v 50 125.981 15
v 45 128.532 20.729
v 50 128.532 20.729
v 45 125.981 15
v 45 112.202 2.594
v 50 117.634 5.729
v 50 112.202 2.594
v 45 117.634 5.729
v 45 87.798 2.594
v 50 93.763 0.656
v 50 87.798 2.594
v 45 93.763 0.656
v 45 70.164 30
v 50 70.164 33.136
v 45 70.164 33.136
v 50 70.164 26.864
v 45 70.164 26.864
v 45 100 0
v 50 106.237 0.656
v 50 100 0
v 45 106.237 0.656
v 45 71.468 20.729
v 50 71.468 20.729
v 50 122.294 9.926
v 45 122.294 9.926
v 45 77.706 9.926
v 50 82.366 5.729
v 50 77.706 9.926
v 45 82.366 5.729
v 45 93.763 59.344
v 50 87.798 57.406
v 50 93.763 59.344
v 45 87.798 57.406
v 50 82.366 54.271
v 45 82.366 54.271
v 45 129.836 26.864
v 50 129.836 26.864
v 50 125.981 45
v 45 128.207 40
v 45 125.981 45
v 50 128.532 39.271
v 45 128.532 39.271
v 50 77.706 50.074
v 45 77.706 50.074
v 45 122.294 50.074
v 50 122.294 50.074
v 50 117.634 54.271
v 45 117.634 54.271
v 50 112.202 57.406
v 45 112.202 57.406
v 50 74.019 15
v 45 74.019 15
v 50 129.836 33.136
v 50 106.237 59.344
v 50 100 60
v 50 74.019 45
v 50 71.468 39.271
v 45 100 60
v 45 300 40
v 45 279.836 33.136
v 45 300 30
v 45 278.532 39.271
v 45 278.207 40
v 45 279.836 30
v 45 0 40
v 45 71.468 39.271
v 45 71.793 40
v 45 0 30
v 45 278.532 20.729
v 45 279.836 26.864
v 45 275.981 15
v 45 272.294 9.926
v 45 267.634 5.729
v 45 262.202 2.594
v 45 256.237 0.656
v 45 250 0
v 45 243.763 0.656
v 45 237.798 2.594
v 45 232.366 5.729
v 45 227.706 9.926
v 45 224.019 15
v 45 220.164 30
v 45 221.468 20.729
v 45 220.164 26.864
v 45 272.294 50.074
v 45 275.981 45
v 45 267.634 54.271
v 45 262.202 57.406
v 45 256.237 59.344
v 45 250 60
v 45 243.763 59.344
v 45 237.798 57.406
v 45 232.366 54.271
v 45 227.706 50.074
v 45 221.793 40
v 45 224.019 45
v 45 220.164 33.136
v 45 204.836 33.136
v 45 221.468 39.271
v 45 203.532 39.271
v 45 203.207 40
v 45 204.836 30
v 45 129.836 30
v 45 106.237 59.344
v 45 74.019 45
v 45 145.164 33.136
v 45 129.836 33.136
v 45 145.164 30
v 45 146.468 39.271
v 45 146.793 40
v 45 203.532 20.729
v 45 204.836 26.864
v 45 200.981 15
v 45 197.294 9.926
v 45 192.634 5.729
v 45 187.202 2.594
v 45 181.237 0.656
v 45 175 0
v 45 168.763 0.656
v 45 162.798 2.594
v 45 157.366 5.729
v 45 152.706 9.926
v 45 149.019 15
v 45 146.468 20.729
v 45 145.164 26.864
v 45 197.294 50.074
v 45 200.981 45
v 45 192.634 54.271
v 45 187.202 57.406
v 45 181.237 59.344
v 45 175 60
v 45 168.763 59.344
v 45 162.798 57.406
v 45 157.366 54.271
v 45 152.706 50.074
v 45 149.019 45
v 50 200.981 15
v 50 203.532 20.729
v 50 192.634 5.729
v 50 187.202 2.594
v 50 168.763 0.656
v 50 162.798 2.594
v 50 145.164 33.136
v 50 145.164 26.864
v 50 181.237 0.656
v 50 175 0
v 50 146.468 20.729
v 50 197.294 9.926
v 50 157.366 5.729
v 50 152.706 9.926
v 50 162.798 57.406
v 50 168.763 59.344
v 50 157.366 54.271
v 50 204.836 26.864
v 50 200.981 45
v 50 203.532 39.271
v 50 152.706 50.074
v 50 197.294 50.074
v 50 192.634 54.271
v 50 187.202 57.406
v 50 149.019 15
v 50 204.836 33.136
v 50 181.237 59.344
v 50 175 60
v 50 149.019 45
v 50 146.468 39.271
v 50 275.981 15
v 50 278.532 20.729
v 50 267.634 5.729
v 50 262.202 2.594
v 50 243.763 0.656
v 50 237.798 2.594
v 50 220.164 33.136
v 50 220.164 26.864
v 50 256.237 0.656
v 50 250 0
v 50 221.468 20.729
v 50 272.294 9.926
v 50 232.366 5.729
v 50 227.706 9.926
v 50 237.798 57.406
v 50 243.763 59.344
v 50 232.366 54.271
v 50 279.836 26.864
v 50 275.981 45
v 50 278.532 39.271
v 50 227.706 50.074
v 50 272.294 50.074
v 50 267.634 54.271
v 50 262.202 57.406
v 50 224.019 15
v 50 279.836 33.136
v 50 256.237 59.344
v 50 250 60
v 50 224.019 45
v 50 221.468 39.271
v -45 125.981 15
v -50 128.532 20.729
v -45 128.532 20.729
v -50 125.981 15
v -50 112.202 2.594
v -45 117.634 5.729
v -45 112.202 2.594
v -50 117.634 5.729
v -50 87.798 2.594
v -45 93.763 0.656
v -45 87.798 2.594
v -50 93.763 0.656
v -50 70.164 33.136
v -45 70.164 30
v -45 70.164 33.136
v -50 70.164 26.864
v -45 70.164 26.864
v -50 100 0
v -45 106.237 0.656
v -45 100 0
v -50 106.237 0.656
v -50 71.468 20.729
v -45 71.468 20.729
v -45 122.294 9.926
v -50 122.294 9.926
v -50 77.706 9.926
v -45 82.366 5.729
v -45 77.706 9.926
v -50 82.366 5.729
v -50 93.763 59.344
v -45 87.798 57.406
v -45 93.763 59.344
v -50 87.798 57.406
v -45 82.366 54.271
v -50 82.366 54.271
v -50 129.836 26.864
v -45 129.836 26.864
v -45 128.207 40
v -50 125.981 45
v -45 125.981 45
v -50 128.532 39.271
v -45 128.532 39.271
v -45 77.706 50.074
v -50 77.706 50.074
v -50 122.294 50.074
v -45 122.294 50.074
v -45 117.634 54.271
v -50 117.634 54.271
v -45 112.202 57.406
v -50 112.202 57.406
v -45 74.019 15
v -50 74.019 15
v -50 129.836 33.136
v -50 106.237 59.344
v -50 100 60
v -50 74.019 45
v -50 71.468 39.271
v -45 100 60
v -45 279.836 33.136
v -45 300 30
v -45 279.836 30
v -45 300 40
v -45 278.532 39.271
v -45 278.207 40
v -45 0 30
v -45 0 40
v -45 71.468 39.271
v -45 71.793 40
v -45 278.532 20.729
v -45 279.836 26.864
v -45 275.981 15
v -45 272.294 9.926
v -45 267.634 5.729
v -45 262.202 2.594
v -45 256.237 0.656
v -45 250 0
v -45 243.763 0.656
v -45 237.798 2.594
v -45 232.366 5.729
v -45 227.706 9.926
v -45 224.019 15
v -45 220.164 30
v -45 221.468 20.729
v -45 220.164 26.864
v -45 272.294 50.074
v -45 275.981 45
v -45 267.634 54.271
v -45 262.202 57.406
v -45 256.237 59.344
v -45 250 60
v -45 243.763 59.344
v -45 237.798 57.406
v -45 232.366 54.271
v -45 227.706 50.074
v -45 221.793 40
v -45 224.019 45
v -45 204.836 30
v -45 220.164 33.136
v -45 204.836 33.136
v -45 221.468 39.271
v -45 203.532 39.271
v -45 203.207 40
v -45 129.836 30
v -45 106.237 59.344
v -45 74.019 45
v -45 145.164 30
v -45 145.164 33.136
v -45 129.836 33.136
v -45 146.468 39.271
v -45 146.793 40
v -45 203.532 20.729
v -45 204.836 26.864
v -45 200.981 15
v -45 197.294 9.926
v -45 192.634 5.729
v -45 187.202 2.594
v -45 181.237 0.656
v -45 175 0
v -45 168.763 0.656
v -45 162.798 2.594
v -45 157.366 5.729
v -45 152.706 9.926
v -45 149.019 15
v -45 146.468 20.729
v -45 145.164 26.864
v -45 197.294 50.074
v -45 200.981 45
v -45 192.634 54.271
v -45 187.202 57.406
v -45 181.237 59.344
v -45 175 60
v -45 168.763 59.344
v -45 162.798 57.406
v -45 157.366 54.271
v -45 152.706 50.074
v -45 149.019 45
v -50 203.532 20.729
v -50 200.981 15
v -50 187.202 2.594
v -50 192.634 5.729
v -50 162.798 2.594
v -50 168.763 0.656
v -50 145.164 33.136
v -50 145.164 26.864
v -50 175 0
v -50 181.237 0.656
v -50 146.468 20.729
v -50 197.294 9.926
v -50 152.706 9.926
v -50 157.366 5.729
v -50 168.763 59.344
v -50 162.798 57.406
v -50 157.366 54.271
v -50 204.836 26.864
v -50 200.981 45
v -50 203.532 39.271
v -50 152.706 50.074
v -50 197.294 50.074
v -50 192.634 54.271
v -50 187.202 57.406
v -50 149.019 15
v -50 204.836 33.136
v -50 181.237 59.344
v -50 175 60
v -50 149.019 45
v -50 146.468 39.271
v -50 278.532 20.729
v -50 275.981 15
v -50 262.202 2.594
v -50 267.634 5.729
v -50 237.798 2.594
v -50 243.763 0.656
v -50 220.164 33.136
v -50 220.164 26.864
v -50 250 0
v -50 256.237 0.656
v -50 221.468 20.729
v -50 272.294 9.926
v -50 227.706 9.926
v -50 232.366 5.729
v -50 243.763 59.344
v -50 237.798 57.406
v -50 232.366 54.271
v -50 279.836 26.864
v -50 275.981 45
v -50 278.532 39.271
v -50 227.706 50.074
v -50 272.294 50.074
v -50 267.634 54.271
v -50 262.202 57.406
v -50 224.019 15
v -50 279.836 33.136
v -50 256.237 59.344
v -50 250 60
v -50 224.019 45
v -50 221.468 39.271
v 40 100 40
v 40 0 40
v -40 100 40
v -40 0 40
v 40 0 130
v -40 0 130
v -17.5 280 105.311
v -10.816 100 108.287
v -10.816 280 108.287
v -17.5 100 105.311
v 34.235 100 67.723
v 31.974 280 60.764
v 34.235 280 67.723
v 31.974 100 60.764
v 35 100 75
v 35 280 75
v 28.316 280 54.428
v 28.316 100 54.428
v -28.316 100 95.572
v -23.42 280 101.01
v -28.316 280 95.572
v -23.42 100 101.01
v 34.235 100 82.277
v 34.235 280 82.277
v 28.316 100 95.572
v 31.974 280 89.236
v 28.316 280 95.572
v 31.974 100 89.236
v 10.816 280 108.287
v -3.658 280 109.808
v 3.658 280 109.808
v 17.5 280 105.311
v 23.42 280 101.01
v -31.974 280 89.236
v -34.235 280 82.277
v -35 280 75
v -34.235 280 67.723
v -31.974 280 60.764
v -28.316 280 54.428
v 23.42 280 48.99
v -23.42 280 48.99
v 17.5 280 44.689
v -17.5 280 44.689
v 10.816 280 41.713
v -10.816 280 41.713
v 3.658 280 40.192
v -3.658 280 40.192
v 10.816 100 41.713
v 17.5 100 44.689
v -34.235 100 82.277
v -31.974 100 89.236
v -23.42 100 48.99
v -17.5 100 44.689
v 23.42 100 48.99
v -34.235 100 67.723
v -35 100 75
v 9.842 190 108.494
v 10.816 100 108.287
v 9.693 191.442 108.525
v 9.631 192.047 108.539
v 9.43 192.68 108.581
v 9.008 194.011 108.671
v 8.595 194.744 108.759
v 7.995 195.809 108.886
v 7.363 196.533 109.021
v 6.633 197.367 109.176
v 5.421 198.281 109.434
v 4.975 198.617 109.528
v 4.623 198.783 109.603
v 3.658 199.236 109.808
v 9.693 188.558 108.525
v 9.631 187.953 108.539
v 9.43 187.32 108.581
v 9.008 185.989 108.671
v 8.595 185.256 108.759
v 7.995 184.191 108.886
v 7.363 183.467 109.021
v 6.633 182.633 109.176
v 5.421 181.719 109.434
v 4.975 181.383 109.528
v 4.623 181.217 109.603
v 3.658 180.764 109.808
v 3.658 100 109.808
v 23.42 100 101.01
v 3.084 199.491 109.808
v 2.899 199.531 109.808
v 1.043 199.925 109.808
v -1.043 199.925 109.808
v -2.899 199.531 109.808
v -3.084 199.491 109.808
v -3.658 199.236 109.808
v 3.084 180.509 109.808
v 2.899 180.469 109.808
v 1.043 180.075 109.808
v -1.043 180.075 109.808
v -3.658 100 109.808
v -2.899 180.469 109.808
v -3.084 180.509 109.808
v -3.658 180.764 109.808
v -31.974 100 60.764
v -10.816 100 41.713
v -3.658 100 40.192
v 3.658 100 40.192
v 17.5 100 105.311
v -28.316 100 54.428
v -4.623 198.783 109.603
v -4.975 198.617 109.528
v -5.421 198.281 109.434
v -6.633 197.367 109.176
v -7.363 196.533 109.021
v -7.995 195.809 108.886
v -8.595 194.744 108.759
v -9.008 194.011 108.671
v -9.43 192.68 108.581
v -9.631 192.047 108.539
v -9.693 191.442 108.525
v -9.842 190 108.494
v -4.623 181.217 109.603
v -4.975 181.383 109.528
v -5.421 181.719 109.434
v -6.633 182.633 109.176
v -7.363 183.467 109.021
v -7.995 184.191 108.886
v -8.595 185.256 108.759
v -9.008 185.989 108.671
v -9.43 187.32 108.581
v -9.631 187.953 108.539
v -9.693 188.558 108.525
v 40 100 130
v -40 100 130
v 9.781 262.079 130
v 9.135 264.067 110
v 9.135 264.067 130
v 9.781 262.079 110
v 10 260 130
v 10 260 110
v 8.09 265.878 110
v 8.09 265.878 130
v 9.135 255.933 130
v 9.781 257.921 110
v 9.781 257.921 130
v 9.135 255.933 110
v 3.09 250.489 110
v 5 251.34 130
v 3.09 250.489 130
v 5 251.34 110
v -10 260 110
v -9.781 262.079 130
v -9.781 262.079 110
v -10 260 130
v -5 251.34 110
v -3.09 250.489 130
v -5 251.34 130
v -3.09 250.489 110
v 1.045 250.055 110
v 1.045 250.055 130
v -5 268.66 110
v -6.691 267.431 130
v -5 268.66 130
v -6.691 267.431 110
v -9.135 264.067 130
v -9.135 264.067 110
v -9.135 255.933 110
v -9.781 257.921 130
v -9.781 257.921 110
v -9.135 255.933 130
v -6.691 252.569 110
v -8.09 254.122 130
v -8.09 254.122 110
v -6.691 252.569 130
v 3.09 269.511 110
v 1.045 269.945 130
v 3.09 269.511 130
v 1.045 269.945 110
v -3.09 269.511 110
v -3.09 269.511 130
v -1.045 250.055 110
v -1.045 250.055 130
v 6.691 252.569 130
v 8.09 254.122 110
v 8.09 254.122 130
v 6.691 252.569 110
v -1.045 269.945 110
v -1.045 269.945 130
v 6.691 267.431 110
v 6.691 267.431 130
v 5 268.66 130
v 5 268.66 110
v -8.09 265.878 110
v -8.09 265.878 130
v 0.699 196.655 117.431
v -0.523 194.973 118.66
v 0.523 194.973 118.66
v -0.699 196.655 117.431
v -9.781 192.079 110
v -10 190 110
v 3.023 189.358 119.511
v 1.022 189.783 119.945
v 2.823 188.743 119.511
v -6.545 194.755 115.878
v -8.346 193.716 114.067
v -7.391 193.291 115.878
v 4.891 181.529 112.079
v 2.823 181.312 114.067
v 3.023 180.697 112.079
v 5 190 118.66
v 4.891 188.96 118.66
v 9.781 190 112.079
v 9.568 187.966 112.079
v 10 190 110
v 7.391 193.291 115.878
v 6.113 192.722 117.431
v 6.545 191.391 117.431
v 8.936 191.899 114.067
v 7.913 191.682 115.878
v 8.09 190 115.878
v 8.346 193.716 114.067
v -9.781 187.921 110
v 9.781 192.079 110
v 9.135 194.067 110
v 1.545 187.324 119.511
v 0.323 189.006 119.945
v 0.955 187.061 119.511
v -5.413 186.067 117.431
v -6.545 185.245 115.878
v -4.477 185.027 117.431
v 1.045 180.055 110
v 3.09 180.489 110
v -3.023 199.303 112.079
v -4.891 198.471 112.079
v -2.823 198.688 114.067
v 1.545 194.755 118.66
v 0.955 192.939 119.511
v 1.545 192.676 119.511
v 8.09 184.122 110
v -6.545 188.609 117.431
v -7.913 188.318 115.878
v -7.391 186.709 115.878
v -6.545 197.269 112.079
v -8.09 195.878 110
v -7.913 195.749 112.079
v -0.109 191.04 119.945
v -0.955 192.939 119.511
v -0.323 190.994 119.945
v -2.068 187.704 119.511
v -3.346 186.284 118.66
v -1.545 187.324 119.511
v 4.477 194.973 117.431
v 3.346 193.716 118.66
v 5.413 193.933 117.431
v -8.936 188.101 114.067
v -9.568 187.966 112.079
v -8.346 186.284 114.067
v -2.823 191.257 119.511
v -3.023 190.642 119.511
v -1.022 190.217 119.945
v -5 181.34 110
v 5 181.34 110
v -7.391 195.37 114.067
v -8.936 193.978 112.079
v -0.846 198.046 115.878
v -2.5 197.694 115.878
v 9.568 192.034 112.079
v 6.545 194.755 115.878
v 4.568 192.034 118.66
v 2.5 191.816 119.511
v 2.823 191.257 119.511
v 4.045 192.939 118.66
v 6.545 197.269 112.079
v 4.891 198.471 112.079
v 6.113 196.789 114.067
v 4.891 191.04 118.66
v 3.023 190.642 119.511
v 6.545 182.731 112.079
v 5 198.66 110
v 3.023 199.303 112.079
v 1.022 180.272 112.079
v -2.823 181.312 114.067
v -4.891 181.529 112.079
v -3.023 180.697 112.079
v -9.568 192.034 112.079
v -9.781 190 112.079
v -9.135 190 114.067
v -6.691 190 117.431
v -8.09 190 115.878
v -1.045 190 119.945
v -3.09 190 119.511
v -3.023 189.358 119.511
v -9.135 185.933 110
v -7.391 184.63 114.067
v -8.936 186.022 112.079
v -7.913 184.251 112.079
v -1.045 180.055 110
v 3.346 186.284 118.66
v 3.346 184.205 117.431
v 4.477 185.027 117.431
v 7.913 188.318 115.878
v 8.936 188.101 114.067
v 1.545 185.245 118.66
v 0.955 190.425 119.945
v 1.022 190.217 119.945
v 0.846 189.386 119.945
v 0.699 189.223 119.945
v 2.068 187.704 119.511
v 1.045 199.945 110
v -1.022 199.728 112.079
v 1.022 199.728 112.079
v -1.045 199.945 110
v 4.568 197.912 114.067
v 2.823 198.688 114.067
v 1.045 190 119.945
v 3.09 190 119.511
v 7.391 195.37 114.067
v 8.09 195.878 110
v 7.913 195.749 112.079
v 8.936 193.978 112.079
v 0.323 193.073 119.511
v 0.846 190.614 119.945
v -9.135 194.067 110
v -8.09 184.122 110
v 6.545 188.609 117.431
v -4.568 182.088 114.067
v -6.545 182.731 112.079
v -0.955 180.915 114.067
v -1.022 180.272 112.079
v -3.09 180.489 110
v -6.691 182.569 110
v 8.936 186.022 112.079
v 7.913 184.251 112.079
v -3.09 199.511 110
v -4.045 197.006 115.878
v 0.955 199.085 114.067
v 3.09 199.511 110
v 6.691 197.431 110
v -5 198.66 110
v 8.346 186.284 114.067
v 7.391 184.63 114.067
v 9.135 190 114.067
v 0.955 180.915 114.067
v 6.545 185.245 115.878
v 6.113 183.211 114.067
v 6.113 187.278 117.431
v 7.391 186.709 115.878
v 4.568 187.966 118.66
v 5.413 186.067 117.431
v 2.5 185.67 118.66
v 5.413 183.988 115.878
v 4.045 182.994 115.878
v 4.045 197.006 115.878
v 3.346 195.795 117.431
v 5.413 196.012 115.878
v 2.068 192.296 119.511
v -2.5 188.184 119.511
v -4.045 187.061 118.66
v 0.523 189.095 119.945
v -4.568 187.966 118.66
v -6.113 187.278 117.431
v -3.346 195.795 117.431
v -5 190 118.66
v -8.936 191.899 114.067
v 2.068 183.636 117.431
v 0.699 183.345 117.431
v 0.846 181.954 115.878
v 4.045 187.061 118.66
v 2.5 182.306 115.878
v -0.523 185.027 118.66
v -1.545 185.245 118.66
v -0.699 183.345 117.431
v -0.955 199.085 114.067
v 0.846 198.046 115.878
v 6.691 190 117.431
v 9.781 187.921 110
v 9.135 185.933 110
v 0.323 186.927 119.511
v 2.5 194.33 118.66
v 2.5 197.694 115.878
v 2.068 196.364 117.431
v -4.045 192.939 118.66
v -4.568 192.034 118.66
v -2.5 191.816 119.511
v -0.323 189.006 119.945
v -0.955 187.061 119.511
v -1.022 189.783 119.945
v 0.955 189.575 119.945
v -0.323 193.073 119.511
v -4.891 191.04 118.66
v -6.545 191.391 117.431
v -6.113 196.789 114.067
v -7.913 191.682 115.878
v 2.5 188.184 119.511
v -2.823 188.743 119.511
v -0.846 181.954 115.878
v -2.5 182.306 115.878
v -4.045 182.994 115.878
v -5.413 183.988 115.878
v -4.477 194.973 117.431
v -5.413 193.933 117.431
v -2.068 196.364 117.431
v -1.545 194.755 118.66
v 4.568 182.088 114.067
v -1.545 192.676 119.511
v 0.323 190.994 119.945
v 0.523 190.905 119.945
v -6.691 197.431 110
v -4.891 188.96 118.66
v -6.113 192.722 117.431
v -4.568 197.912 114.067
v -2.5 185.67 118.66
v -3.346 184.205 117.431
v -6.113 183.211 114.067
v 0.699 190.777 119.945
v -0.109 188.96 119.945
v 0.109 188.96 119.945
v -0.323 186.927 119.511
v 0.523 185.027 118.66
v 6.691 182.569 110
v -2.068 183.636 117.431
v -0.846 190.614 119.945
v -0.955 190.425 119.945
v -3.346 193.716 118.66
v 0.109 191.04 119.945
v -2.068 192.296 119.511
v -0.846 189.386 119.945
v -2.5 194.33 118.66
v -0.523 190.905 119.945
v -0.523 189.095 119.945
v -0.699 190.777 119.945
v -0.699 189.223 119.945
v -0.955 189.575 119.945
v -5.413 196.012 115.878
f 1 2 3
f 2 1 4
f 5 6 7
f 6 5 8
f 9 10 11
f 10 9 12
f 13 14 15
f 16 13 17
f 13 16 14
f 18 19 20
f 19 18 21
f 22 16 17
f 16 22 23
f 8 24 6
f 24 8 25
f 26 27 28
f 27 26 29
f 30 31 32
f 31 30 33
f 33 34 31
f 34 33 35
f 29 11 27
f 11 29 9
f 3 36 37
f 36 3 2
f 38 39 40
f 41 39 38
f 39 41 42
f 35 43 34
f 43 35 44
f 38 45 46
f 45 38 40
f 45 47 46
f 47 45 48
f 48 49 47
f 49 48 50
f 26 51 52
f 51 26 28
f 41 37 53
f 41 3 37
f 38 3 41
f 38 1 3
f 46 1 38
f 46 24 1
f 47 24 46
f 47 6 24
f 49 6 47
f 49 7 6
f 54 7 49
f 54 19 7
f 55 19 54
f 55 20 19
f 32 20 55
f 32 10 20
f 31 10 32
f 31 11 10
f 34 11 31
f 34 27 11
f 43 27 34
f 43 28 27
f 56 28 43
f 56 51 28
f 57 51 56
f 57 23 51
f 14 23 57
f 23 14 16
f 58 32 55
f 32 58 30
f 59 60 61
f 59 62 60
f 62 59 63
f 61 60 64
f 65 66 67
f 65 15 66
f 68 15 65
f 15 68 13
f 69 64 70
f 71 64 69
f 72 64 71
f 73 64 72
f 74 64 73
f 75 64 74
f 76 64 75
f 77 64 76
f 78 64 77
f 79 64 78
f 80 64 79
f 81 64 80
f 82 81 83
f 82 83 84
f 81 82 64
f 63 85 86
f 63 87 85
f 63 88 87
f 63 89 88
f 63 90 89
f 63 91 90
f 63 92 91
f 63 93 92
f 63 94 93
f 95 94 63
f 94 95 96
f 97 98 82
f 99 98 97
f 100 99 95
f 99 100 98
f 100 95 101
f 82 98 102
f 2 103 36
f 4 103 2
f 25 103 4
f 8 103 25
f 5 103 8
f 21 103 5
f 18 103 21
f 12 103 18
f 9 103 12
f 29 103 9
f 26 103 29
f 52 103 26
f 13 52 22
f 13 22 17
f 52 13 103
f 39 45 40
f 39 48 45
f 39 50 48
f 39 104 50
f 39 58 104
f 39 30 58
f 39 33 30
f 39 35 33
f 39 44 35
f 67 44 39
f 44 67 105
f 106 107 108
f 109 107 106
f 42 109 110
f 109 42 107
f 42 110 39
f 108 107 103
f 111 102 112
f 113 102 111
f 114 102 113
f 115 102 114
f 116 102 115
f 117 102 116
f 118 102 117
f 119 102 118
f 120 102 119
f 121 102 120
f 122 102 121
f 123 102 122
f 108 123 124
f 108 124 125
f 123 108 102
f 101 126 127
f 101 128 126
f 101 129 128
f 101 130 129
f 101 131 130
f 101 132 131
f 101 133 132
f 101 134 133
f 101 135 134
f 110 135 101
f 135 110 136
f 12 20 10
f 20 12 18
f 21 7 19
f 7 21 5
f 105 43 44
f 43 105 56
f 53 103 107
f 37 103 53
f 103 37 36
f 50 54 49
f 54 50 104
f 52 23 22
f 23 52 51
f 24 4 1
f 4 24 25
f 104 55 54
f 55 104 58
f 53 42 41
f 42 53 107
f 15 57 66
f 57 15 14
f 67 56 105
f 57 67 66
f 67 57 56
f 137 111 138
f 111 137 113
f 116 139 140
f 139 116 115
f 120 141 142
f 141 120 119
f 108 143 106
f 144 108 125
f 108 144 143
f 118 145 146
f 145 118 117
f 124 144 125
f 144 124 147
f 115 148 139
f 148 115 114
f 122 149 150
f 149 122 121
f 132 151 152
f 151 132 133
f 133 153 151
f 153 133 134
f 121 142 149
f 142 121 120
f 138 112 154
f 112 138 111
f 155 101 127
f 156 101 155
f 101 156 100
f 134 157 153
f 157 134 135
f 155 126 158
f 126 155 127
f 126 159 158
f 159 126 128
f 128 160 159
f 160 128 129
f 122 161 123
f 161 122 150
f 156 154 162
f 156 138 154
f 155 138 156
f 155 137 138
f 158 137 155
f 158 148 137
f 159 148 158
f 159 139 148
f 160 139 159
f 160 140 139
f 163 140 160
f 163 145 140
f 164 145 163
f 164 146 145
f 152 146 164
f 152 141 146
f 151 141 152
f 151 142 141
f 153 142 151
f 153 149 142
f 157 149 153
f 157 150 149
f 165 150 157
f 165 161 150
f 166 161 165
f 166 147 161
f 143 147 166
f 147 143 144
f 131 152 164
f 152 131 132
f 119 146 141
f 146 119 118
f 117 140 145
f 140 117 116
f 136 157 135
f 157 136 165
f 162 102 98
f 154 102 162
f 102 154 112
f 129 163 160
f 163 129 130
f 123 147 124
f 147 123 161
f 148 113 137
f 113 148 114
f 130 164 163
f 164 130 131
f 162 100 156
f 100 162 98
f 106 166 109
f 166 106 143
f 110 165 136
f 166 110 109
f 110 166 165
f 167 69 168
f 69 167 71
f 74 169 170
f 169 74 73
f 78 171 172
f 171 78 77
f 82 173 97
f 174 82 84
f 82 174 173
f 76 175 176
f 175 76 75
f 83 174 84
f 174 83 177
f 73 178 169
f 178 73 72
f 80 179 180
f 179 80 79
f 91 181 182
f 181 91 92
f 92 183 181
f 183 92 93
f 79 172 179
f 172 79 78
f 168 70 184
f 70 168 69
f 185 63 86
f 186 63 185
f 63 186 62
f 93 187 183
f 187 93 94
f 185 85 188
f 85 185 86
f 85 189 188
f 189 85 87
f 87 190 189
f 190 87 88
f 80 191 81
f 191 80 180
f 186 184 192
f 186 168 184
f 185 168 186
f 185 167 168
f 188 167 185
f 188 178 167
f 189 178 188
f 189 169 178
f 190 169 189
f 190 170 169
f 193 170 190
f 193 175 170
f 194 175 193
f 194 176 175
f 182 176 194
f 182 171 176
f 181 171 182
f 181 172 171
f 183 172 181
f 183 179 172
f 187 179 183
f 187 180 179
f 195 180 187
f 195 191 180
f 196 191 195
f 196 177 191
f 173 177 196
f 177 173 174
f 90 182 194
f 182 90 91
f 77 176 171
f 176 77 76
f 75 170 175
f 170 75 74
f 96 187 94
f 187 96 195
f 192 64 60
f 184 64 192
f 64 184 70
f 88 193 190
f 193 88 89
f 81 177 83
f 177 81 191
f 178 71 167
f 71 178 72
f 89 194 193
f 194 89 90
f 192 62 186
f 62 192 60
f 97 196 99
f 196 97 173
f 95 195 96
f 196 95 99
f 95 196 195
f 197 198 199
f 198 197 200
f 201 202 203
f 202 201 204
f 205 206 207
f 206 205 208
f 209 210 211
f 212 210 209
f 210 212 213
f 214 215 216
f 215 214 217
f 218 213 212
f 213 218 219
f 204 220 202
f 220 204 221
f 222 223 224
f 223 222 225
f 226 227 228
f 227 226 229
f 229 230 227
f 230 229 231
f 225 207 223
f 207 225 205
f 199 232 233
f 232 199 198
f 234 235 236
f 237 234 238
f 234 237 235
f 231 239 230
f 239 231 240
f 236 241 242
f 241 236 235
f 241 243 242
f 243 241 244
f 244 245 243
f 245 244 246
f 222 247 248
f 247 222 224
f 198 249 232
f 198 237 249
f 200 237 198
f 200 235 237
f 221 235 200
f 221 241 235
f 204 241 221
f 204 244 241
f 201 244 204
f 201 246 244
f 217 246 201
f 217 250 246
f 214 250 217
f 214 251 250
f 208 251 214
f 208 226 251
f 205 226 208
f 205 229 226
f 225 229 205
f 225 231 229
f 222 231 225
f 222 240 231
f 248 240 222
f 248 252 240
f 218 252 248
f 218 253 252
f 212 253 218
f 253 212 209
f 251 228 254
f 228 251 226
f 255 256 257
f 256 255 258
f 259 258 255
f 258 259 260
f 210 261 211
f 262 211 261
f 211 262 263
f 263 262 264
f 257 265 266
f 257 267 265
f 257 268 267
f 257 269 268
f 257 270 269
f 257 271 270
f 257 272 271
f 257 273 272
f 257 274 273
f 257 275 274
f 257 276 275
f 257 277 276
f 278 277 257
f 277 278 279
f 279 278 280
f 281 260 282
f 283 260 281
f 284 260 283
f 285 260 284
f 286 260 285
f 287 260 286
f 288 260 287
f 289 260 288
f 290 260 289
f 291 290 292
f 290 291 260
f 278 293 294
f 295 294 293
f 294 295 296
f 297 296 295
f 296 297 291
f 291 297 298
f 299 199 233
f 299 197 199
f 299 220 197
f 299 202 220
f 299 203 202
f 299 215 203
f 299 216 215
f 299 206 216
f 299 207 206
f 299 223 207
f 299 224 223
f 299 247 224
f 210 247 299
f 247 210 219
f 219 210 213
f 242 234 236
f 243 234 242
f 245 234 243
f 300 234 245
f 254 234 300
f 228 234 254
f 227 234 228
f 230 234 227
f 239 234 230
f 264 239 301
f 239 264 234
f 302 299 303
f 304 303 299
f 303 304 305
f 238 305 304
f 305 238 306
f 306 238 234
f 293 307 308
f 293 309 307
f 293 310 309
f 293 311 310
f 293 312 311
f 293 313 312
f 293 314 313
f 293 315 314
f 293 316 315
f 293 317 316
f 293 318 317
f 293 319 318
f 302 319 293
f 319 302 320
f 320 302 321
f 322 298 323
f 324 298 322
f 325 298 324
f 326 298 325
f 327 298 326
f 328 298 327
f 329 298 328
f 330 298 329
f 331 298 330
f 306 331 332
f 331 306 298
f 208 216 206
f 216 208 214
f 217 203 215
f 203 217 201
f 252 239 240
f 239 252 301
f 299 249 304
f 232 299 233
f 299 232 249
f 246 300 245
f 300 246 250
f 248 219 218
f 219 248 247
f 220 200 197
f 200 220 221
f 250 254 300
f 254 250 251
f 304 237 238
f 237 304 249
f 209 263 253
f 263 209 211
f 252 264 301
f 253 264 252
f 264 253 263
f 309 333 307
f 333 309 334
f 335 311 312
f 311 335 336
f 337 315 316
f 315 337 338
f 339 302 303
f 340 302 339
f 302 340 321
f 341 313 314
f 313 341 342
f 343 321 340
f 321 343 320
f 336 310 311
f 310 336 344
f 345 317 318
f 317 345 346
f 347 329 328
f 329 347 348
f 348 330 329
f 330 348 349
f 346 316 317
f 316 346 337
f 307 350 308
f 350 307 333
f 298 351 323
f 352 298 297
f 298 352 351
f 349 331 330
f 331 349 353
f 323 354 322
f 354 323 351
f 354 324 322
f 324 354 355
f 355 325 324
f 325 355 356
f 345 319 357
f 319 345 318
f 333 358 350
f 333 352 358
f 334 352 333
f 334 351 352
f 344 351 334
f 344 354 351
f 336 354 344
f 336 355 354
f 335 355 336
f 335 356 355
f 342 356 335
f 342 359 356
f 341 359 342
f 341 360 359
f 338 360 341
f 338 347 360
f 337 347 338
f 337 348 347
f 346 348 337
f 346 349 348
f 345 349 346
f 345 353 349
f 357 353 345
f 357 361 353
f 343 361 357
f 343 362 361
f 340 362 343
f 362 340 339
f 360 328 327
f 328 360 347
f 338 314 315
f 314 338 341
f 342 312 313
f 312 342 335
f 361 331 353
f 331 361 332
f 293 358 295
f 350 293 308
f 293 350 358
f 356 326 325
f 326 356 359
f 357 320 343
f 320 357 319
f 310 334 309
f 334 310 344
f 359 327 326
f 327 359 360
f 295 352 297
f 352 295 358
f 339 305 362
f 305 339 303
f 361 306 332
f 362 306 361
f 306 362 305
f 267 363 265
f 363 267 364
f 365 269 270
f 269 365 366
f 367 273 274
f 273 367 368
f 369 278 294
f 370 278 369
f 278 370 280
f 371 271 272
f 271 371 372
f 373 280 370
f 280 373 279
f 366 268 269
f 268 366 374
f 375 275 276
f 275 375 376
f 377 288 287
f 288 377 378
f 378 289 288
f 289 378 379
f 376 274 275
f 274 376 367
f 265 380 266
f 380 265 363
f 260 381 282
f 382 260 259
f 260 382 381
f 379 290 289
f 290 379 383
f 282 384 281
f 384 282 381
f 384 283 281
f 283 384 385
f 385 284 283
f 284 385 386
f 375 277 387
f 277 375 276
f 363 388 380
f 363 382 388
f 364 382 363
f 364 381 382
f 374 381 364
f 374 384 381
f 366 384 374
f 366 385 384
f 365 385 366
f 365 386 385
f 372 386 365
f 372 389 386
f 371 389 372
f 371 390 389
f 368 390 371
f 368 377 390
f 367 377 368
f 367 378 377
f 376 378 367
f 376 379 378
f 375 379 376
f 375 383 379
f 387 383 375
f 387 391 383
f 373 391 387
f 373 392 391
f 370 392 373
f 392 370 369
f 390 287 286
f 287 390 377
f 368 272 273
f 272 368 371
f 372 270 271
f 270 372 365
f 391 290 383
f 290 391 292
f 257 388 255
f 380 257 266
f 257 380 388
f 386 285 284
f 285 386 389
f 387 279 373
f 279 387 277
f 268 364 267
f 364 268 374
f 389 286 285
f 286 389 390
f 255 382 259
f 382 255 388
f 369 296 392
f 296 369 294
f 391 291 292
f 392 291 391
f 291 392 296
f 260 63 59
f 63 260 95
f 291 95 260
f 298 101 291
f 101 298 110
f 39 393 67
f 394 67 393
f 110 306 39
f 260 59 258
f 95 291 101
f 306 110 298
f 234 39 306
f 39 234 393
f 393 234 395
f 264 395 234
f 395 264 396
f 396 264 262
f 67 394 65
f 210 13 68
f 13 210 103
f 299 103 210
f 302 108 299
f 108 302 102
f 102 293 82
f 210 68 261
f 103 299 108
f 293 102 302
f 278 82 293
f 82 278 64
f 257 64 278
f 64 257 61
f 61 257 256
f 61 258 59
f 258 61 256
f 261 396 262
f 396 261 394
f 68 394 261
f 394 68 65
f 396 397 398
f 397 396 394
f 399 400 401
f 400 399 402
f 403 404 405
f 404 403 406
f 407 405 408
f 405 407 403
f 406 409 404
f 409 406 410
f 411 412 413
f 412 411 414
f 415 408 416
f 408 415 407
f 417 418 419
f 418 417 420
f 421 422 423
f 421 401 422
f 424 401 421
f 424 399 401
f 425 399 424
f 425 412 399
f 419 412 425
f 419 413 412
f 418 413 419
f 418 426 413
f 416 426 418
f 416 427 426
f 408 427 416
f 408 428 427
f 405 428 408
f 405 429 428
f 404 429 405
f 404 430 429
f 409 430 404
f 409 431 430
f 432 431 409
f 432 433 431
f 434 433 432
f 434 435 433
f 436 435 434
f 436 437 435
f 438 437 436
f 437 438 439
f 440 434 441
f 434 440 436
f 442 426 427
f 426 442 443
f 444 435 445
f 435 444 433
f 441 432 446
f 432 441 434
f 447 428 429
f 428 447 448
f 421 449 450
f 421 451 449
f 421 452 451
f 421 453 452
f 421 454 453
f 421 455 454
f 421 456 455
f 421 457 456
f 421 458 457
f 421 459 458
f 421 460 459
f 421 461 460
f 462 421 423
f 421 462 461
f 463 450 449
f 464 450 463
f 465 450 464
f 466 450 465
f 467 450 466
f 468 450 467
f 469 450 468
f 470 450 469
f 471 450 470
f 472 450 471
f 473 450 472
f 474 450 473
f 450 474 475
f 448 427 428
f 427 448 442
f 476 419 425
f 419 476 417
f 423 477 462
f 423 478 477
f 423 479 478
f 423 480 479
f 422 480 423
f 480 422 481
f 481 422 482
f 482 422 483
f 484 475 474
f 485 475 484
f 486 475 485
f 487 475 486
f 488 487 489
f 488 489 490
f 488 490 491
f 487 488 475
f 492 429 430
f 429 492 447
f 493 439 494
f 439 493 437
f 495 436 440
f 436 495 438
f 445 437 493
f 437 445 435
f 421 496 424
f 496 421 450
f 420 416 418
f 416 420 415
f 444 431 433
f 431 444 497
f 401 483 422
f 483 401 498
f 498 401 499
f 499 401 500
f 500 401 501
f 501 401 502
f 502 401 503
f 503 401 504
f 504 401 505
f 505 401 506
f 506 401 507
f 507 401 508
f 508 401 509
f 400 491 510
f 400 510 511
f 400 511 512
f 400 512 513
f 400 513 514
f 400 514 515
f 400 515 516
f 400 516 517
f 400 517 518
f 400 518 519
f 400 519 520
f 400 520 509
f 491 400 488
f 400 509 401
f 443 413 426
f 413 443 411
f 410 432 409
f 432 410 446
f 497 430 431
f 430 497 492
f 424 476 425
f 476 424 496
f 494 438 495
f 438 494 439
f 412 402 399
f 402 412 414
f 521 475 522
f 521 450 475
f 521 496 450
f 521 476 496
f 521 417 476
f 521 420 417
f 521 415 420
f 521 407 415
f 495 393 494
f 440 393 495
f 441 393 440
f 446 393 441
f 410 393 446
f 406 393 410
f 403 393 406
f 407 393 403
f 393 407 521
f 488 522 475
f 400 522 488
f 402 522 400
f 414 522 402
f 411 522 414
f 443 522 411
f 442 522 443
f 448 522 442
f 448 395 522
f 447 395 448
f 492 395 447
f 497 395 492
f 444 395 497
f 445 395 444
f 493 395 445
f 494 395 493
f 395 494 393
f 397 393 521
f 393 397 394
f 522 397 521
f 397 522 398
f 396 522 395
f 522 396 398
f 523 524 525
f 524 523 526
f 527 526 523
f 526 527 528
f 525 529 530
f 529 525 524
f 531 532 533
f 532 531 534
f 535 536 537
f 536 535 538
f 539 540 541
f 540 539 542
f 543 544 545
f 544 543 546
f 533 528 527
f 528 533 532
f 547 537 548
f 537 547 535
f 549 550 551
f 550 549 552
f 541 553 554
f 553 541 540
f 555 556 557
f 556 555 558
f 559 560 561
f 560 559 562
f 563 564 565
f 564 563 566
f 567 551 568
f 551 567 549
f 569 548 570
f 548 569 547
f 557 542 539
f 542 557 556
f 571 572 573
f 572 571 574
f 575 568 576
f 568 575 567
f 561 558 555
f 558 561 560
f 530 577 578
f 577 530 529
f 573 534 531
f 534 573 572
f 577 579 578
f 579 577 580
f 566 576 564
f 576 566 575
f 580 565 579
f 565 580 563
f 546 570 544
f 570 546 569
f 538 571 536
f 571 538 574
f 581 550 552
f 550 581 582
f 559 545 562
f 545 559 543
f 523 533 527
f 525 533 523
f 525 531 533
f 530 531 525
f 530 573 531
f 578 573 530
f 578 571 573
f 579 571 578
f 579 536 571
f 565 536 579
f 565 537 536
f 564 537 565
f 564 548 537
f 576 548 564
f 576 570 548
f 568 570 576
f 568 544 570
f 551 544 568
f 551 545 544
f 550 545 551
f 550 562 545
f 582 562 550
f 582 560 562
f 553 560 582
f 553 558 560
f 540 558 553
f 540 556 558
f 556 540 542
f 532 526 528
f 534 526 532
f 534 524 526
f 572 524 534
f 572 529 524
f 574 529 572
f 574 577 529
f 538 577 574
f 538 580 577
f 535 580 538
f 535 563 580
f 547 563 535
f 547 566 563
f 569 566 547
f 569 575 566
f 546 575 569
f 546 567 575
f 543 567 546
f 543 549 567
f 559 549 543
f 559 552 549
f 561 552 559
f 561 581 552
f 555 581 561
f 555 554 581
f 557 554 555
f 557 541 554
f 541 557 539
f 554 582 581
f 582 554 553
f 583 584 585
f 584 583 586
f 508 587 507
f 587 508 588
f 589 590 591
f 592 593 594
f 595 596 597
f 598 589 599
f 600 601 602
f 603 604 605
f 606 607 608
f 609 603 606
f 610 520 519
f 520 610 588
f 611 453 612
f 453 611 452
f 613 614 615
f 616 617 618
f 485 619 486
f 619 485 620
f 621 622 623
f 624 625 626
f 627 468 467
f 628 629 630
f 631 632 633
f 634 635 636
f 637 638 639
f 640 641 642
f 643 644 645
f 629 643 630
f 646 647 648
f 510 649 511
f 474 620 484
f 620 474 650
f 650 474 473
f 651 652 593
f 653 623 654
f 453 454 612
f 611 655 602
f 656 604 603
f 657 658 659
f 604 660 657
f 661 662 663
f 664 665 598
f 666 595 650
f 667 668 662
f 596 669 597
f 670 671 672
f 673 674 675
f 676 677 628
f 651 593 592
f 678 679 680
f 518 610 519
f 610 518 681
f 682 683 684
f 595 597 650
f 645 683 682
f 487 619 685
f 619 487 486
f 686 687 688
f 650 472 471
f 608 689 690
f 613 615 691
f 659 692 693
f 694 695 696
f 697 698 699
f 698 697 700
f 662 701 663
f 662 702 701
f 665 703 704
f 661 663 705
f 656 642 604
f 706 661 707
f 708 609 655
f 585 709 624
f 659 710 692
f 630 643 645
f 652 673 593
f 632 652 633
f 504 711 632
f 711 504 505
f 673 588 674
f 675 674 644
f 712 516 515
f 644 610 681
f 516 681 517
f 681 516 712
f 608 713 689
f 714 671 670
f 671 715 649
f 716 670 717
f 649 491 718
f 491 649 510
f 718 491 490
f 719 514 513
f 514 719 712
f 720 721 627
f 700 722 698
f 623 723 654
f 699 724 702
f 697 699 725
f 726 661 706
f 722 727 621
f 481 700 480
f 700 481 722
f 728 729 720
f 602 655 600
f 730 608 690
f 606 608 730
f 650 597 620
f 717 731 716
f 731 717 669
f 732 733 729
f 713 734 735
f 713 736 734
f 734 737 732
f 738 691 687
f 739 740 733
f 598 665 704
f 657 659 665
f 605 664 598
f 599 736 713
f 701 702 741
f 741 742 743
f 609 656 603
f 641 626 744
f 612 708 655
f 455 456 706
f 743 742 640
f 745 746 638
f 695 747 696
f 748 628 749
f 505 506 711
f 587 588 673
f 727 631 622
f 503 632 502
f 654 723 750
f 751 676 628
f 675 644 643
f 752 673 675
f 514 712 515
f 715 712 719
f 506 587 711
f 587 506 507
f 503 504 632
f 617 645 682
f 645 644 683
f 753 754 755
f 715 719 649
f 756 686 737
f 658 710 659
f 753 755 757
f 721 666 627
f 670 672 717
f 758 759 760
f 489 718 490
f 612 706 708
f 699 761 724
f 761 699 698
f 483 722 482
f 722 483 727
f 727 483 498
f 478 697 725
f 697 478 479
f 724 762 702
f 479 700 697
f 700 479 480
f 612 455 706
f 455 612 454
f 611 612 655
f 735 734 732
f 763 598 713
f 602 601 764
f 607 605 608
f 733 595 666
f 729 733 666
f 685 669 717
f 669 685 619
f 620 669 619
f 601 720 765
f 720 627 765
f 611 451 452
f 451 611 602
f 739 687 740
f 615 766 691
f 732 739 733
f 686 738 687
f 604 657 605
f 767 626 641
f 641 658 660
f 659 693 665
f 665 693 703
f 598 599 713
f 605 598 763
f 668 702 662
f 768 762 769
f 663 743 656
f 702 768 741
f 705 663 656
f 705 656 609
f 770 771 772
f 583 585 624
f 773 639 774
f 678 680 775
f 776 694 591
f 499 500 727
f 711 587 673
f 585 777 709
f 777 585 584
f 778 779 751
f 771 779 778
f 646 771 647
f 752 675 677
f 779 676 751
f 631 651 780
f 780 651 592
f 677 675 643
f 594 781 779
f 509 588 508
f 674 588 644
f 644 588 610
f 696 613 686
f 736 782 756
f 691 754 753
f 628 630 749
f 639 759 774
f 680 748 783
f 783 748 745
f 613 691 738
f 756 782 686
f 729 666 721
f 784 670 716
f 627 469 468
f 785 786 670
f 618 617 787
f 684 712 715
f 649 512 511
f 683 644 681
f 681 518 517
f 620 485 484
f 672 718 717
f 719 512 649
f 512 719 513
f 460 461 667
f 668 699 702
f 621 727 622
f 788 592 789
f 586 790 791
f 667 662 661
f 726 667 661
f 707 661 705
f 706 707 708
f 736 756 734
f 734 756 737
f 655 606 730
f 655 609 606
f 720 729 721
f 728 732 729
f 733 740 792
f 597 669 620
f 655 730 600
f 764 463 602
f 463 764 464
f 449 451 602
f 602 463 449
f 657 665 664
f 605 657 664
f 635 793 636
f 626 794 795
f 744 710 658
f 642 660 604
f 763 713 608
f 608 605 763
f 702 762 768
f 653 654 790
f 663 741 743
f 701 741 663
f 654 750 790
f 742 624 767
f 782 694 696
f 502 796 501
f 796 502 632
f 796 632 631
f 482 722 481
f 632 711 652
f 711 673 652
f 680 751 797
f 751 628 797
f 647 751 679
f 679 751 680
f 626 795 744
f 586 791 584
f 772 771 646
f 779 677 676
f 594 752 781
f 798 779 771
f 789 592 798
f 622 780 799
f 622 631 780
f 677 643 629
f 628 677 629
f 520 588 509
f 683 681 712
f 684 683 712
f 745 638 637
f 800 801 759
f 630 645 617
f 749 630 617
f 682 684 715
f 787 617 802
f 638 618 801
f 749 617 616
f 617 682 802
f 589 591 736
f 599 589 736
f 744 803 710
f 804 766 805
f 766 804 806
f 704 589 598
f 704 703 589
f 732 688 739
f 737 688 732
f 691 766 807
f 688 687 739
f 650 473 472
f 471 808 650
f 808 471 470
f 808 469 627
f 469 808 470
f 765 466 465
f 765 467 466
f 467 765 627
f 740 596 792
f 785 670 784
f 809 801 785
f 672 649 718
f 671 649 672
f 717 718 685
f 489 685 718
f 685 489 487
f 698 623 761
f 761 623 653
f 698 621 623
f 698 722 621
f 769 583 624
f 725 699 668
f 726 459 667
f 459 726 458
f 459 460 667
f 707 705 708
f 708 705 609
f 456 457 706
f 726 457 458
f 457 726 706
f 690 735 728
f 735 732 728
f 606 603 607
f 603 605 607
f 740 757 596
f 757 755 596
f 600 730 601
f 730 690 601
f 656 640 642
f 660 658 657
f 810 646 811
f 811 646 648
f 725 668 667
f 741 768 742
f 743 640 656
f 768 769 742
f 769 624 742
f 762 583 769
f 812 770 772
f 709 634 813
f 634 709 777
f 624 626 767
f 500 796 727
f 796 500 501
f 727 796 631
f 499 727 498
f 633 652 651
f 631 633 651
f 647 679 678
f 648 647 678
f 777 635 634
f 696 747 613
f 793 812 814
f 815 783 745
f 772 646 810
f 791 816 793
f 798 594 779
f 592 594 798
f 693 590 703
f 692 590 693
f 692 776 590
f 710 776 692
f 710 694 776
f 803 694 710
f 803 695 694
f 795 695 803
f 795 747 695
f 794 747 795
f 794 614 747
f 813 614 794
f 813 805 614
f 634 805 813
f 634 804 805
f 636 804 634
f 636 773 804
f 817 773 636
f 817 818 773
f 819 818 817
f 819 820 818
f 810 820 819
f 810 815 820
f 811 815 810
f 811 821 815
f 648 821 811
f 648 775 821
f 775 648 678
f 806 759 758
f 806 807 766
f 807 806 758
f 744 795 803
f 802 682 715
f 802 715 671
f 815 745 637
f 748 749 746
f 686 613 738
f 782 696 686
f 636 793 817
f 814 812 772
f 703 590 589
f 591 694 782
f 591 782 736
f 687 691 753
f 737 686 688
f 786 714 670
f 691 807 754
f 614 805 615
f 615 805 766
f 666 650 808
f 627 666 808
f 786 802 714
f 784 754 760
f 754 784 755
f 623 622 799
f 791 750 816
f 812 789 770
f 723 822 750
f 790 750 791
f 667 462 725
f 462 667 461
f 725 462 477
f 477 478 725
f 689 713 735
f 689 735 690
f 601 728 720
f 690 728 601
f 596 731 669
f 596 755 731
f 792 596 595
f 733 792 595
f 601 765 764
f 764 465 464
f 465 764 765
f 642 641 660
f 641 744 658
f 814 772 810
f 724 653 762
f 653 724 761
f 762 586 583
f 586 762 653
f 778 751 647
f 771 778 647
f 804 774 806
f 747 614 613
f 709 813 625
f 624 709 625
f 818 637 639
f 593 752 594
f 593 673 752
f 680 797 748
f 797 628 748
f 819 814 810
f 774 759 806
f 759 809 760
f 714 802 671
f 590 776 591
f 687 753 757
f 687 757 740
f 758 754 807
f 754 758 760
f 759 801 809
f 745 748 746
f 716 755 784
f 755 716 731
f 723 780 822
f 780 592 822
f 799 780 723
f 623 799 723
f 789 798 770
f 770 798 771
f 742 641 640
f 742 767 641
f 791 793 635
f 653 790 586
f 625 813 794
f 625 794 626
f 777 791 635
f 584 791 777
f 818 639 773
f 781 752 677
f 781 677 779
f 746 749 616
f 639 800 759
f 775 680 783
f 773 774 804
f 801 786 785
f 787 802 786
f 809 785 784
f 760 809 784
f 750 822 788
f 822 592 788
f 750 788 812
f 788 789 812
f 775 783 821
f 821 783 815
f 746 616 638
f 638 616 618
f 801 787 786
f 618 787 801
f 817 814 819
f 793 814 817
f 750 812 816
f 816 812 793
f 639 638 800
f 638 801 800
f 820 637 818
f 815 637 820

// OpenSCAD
module locomotive(
    boiler_length = 180,
    boiler_radius = 35,
    cab_length = 100,
    chassis_height = 10,
    funnel_height = 20,
    funnel_radius = 10,
    wheel_radius = 30,
    wheel_width = 5,
    loading_gauge = 100,
    length = 300)
    {
    chassis_width = loading_gauge - wheel_width * 2;
    translate([- chassis_width / 2, 0, wheel_radius]) cube([chassis_width, length, 10]);
    for(is_mirrored = [0, 1]) {
        mirror([is_mirrored, 0, 0]) for(y = [100, 175, 250]) {
            translate([chassis_width / 2, y, wheel_radius]) rotate([0, 90, 0]) cylinder(r = wheel_radius, h = wheel_width);
        }
    }   
    translate([0, cab_length, wheel_radius + chassis_height + boiler_radius])
        rotate([270, 0, 0])
        cylinder(r = boiler_radius, h = boiler_length);
    translate([-(chassis_width - 10) / 2, 0, wheel_radius + chassis_height]) cube([chassis_width - 10, cab_length, 2 * boiler_radius + funnel_height]);
    translate([0, cab_length + boiler_length - 2 * funnel_radius, wheel_radius + chassis_height + boiler_radius * 2]) cylinder(r = funnel_radius, h = funnel_height);
    translate([0, cab_length + (boiler_length / 2), wheel_radius + chassis_height + boiler_radius * 2]) sphere(r = funnel_radius);
}

locomotive();
